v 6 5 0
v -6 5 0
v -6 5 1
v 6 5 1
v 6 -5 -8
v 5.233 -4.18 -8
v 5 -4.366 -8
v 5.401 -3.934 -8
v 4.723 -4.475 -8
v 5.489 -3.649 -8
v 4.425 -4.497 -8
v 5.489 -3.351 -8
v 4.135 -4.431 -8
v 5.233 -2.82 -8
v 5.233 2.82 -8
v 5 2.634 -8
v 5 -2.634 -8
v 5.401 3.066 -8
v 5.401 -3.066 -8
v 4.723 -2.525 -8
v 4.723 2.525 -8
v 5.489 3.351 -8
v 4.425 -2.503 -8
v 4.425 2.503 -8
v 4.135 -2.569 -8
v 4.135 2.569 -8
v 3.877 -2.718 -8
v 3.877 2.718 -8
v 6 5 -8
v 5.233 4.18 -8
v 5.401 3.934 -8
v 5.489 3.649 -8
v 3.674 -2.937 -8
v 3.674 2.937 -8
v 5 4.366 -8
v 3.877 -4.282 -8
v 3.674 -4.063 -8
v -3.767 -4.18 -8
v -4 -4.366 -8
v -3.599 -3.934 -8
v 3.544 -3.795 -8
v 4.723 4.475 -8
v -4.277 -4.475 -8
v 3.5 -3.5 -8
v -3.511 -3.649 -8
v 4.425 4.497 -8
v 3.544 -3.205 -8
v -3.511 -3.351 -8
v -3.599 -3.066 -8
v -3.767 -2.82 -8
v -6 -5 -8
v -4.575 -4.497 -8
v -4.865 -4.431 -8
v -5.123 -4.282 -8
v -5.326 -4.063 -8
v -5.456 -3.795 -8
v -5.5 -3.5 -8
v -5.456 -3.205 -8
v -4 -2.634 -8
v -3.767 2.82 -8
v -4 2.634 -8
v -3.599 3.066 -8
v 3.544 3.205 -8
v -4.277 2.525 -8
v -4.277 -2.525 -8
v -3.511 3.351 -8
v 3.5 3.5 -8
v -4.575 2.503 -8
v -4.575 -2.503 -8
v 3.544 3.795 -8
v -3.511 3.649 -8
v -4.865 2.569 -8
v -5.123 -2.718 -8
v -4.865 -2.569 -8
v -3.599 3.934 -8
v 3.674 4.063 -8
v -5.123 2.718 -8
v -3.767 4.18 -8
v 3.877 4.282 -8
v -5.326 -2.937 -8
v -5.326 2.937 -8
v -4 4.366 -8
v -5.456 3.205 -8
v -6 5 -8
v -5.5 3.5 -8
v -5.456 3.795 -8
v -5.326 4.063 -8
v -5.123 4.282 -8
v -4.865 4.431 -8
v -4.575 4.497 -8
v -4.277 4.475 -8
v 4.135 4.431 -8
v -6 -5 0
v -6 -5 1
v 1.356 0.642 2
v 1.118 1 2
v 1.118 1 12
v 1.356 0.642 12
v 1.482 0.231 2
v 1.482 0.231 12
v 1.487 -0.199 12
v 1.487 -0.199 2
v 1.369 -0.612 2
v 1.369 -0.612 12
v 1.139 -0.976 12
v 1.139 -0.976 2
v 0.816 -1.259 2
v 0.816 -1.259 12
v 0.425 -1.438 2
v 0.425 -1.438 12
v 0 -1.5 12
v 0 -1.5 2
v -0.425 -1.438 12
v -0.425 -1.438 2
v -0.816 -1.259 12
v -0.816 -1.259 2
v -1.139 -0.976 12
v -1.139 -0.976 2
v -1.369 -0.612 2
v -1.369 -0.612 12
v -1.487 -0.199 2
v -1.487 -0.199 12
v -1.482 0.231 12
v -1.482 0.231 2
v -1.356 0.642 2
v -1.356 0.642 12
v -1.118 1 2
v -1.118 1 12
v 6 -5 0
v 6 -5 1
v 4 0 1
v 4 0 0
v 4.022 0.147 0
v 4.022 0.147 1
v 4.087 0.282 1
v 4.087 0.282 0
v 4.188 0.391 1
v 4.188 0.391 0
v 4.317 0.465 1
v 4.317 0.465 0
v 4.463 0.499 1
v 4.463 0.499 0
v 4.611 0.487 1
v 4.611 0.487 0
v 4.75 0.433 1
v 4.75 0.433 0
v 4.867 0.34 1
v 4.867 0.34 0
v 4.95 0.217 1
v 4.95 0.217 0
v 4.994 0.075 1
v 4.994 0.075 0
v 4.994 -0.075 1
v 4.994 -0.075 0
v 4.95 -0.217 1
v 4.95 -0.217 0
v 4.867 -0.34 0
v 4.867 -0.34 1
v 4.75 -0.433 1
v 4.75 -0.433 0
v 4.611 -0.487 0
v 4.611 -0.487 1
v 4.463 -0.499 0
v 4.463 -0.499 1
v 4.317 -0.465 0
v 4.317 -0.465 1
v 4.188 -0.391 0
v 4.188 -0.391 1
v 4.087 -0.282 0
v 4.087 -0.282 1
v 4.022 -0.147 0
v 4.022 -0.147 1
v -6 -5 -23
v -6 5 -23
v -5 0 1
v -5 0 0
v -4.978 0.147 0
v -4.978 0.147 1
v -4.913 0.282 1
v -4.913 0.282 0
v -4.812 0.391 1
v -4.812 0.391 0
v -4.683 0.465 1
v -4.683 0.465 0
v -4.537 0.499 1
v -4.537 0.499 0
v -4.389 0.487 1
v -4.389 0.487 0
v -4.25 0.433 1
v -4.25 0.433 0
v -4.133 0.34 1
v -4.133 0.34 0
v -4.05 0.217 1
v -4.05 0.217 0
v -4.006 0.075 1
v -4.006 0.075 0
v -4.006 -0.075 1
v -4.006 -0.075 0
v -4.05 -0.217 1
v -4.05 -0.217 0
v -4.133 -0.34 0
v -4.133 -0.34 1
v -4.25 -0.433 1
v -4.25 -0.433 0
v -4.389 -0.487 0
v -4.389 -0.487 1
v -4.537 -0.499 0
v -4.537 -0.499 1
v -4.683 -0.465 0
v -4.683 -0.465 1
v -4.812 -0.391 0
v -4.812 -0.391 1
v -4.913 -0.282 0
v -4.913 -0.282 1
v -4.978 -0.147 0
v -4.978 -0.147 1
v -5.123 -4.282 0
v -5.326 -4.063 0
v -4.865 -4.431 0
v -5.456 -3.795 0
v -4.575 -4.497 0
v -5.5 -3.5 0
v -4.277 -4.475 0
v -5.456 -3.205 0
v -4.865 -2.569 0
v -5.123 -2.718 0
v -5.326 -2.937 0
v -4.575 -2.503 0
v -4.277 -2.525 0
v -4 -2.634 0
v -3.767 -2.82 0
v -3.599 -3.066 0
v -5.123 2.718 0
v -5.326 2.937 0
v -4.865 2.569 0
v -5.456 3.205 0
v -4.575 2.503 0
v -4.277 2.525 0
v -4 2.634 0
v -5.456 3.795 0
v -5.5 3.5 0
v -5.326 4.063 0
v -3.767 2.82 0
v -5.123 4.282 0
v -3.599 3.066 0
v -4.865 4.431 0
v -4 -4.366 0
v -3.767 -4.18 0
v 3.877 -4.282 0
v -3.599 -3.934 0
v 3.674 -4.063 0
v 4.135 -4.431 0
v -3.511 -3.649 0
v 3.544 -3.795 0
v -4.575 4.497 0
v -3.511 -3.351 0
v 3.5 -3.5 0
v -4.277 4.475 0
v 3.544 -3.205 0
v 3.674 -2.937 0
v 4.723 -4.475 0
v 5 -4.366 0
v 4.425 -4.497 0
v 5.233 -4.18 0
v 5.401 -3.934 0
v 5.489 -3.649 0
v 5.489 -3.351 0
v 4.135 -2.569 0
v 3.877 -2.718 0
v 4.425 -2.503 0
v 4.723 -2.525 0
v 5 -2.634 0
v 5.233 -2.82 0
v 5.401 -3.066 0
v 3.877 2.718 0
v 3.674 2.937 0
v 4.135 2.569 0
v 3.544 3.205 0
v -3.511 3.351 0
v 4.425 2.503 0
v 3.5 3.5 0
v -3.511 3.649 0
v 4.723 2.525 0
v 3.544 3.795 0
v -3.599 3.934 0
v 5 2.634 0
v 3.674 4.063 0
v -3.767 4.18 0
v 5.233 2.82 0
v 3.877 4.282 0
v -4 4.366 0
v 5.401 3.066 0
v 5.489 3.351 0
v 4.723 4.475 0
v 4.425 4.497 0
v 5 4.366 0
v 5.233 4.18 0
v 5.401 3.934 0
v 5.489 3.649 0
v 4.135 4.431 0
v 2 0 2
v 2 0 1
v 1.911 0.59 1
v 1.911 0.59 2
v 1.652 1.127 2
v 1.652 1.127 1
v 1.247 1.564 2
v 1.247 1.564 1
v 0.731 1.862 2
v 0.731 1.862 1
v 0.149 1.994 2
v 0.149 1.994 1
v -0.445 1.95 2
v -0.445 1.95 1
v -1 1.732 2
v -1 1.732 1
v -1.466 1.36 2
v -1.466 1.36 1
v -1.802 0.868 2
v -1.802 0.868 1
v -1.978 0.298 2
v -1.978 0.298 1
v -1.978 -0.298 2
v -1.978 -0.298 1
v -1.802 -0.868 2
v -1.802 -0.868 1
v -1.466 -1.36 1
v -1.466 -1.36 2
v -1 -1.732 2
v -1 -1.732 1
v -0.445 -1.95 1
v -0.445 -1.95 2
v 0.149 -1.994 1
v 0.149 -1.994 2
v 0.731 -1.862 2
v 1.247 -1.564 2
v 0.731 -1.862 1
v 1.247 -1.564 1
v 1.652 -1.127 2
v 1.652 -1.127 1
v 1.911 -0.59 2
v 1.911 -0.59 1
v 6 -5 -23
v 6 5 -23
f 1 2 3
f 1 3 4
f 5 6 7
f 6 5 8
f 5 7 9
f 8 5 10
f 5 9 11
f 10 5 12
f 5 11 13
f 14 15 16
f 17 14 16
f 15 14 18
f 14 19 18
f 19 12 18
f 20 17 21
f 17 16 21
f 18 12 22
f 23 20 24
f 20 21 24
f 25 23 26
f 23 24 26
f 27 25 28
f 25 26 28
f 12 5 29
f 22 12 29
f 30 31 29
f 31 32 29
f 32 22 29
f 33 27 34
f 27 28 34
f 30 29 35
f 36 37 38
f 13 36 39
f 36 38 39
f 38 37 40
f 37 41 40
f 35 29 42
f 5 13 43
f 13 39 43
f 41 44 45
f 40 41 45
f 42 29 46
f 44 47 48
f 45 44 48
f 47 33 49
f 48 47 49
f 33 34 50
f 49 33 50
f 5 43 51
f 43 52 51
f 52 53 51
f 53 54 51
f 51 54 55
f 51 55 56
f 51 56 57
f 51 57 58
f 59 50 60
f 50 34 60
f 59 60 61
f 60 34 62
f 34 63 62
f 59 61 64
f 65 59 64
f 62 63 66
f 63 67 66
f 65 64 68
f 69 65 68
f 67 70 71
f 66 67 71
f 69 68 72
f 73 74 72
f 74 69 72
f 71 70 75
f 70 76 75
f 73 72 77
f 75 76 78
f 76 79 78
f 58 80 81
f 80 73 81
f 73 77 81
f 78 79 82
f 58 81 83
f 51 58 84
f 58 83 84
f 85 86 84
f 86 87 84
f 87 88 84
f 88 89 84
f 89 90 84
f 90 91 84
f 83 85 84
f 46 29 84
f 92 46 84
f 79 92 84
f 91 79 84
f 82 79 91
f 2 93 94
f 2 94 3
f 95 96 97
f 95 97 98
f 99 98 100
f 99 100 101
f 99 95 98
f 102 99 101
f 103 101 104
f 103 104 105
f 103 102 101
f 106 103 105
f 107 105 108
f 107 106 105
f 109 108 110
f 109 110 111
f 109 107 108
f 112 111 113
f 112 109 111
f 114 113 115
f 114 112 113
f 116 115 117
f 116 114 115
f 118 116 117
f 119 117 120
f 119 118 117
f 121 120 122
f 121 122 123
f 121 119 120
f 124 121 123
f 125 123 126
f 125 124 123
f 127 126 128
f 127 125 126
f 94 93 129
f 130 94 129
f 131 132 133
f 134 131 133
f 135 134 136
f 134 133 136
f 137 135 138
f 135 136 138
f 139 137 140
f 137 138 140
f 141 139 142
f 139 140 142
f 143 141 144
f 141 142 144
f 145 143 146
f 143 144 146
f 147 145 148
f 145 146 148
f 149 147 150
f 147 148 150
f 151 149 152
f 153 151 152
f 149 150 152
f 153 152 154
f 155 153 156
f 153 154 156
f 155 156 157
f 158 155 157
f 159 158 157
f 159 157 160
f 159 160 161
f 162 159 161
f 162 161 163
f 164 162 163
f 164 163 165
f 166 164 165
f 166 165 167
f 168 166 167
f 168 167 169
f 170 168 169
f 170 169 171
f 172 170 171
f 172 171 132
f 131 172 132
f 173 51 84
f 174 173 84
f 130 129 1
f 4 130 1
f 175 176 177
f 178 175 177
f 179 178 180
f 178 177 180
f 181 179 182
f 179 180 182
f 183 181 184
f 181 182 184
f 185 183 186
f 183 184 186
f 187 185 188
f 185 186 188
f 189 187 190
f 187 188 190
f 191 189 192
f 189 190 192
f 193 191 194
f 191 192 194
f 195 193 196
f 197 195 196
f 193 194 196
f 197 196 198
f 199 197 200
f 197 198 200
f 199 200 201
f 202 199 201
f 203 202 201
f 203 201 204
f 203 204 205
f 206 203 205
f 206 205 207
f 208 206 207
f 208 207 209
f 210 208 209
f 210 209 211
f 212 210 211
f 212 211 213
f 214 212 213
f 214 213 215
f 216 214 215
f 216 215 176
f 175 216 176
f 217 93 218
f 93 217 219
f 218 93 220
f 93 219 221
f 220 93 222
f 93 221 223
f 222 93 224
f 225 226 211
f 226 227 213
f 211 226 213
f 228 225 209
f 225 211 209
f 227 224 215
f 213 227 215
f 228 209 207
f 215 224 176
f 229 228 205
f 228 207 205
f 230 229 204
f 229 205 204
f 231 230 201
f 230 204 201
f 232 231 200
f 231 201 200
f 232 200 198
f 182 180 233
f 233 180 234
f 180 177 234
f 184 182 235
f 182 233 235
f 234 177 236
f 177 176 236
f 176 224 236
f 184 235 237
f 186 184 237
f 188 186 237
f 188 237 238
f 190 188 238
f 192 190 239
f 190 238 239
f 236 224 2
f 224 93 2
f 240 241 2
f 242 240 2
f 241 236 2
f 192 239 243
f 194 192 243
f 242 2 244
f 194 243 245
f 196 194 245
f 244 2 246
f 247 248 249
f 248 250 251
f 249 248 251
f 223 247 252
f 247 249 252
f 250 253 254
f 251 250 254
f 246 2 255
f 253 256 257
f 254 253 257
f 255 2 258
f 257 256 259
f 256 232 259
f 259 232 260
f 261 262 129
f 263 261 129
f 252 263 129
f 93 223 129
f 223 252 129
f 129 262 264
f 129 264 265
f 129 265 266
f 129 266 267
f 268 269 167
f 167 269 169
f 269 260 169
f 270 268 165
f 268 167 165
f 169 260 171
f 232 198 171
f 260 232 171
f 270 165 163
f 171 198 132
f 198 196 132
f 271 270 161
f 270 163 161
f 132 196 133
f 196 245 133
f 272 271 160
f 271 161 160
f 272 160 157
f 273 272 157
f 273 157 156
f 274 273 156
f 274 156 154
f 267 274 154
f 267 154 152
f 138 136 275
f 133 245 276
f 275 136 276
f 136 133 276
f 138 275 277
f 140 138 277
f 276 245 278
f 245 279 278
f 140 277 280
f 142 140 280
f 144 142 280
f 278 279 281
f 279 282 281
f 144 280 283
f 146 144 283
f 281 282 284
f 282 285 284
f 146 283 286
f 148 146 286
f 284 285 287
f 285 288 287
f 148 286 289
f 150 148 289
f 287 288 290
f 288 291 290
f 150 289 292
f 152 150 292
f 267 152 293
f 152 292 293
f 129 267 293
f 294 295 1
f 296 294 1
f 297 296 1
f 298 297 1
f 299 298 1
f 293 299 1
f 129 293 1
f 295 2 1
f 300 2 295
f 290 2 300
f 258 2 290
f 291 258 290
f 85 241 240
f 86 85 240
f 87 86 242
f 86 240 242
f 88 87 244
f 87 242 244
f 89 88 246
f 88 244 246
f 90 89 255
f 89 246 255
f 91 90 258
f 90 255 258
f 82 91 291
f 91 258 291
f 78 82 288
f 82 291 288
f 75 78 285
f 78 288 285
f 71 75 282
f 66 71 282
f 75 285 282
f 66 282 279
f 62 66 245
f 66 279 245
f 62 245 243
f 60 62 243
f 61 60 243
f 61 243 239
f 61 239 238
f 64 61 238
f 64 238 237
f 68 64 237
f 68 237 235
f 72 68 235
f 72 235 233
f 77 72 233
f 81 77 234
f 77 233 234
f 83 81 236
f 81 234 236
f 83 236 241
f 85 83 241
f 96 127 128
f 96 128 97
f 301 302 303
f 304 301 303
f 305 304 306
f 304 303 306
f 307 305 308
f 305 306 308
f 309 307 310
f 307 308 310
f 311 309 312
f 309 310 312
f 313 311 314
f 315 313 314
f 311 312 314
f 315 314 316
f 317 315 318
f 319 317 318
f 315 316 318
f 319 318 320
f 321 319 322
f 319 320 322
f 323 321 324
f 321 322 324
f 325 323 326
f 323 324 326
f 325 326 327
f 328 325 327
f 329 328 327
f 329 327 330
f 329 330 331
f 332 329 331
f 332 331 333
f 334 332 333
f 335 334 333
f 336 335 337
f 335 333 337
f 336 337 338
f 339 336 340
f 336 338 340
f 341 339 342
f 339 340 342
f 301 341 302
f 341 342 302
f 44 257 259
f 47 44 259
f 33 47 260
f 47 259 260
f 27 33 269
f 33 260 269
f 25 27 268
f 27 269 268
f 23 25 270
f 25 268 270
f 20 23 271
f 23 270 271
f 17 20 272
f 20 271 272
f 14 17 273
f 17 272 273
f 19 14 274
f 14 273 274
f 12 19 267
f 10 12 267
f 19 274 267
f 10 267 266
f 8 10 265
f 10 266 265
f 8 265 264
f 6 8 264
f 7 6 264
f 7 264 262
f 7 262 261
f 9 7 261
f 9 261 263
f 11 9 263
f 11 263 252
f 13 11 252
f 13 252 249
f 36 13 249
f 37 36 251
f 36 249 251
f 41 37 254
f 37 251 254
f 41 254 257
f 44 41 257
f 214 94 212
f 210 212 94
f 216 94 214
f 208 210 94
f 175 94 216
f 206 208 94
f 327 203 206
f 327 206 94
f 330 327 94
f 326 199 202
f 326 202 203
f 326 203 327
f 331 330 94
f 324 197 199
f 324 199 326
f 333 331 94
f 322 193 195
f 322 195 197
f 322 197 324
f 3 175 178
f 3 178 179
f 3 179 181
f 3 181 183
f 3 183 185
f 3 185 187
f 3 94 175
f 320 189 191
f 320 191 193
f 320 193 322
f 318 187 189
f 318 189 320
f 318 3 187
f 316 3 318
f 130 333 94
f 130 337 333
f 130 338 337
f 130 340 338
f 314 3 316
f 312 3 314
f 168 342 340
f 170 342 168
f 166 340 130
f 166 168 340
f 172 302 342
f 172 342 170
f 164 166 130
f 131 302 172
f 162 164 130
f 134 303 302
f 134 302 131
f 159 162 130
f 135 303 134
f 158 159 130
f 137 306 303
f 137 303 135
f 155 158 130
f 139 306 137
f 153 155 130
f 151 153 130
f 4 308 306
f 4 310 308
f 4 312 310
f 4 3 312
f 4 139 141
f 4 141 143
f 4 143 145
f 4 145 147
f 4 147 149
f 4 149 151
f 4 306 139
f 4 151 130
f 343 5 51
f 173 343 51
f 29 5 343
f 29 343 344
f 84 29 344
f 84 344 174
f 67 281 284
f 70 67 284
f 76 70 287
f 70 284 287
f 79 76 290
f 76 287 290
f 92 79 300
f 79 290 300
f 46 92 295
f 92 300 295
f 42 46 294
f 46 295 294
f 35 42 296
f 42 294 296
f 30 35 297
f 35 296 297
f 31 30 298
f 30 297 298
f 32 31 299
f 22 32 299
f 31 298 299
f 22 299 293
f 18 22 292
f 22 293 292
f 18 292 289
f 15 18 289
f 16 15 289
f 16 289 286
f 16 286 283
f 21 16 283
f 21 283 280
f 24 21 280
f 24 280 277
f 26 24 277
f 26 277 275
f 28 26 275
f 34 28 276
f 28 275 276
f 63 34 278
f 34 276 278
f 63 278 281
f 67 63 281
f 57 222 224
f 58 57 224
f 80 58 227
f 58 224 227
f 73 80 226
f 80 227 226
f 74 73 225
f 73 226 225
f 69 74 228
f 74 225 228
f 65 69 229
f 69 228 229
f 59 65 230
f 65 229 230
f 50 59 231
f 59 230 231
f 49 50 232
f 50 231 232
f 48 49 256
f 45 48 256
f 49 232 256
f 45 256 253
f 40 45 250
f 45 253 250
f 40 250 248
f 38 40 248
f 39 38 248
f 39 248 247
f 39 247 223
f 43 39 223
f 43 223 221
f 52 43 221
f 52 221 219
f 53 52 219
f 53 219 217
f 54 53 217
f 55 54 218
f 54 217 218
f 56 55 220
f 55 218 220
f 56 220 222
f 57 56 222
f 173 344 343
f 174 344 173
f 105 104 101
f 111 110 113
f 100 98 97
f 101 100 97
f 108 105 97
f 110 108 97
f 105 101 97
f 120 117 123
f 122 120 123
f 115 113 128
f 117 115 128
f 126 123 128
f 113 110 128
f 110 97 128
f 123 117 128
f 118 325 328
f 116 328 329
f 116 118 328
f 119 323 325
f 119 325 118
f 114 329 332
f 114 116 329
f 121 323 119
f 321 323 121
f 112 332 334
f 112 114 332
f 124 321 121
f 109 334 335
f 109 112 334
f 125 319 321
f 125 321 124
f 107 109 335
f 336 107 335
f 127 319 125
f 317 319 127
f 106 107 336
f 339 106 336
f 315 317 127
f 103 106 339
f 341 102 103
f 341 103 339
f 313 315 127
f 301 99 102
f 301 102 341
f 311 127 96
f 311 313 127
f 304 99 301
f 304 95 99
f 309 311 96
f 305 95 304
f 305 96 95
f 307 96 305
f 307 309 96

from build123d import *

# Parameters (mm, degrees)
SKETCH_1_W          = 12
SKETCH_1_H          = 10
EXTRUDE_1_DEPTH     = 1
SKETCH_2_R          = 1
EXTRUDE_2_DEPTH     = 8
SKETCH_3_R          = 2
EXTRUDE_3_DEPTH     = 1
EXTRUDE_4_DEPTH     = 10
SKETCH_5_W          = 12
SKETCH_5_H          = 10
EXTRUDE_5_DEPTH     = 15
CUT_EXTRUDE_1_REACH = 14
SKETCH_6_R          = 0.5


with BuildPart() as part:
    # 草图1 → 凸台-拉伸1 (new body)
    with BuildSketch(Plane.XY):
        Rectangle(SKETCH_1_W, SKETCH_1_H)
    extrude(amount=EXTRUDE_1_DEPTH)

    # 草图2 → 凸台-拉伸2 (add)
    with BuildSketch(Plane(origin=(0, 0, 0), x_dir=(-1, 0, 0), z_dir=(0, 0, -1))):
        with Locations((-4.5, 3.5)):
            Circle(SKETCH_2_R)
        with Locations((4.5, 3.5)):
            Circle(SKETCH_2_R)
        with Locations((4.5, -3.5)):
            Circle(SKETCH_2_R)
        with Locations((-4.5, -3.5)):
            Circle(SKETCH_2_R)
    extrude(amount=EXTRUDE_2_DEPTH)

    # 草图3 → 凸台-拉伸3 (add)
    with BuildSketch(Plane.XY.offset(1)):
        Circle(SKETCH_3_R)
    extrude(amount=EXTRUDE_3_DEPTH)

    # 草图4 → 凸台-拉伸4 (add)
    with BuildSketch(Plane.XY.offset(2)):
        with BuildLine():
            Line((-1.118033989, 1), (1.118033989, 1))
            ThreePointArc((1.118033989, 1), (0, -1.5), (-1.118033989, 1))
        make_face()
    extrude(amount=EXTRUDE_4_DEPTH)

    # 草图5 → 凸台-拉伸5 (add)
    with BuildSketch(Plane(origin=(0, 0, -8), x_dir=(-1, 0, 0), z_dir=(0, 0, -1))):
        Rectangle(SKETCH_5_W, SKETCH_5_H)
    extrude(amount=EXTRUDE_5_DEPTH)

    # 草图6 → 切除-拉伸1 (cut, up to next)
    with BuildSketch(Plane(origin=(0, 0, 0), x_dir=(-1, 0, 0), z_dir=(0, 0, -1)), mode=Mode.PRIVATE) as cut_extrude_1_sk1:
        with Locations((-4.5, 0)):
            Circle(SKETCH_6_R)
    cut_extrude_1_tool1 = extrude(cut_extrude_1_sk1.sketch, amount=-CUT_EXTRUDE_1_REACH, mode=Mode.PRIVATE) & part.part
    add(cut_extrude_1_tool1.solids().sort_by_distance((4.5, 0, 0))[0], mode=Mode.SUBTRACT)
    # 草图6 → 切除-拉伸1 (cut, up to next)
    with BuildSketch(Plane(origin=(0, 0, 0), x_dir=(-1, 0, 0), z_dir=(0, 0, -1)), mode=Mode.PRIVATE) as cut_extrude_1_sk2:
        with Locations((4.5, 0)):
            Circle(SKETCH_6_R)
    cut_extrude_1_tool2 = extrude(cut_extrude_1_sk2.sketch, amount=-CUT_EXTRUDE_1_REACH, mode=Mode.PRIVATE) & part.part
    add(cut_extrude_1_tool2.solids().sort_by_distance((-4.5, 0, 0))[0], mode=Mode.SUBTRACT)


solid = part.part
